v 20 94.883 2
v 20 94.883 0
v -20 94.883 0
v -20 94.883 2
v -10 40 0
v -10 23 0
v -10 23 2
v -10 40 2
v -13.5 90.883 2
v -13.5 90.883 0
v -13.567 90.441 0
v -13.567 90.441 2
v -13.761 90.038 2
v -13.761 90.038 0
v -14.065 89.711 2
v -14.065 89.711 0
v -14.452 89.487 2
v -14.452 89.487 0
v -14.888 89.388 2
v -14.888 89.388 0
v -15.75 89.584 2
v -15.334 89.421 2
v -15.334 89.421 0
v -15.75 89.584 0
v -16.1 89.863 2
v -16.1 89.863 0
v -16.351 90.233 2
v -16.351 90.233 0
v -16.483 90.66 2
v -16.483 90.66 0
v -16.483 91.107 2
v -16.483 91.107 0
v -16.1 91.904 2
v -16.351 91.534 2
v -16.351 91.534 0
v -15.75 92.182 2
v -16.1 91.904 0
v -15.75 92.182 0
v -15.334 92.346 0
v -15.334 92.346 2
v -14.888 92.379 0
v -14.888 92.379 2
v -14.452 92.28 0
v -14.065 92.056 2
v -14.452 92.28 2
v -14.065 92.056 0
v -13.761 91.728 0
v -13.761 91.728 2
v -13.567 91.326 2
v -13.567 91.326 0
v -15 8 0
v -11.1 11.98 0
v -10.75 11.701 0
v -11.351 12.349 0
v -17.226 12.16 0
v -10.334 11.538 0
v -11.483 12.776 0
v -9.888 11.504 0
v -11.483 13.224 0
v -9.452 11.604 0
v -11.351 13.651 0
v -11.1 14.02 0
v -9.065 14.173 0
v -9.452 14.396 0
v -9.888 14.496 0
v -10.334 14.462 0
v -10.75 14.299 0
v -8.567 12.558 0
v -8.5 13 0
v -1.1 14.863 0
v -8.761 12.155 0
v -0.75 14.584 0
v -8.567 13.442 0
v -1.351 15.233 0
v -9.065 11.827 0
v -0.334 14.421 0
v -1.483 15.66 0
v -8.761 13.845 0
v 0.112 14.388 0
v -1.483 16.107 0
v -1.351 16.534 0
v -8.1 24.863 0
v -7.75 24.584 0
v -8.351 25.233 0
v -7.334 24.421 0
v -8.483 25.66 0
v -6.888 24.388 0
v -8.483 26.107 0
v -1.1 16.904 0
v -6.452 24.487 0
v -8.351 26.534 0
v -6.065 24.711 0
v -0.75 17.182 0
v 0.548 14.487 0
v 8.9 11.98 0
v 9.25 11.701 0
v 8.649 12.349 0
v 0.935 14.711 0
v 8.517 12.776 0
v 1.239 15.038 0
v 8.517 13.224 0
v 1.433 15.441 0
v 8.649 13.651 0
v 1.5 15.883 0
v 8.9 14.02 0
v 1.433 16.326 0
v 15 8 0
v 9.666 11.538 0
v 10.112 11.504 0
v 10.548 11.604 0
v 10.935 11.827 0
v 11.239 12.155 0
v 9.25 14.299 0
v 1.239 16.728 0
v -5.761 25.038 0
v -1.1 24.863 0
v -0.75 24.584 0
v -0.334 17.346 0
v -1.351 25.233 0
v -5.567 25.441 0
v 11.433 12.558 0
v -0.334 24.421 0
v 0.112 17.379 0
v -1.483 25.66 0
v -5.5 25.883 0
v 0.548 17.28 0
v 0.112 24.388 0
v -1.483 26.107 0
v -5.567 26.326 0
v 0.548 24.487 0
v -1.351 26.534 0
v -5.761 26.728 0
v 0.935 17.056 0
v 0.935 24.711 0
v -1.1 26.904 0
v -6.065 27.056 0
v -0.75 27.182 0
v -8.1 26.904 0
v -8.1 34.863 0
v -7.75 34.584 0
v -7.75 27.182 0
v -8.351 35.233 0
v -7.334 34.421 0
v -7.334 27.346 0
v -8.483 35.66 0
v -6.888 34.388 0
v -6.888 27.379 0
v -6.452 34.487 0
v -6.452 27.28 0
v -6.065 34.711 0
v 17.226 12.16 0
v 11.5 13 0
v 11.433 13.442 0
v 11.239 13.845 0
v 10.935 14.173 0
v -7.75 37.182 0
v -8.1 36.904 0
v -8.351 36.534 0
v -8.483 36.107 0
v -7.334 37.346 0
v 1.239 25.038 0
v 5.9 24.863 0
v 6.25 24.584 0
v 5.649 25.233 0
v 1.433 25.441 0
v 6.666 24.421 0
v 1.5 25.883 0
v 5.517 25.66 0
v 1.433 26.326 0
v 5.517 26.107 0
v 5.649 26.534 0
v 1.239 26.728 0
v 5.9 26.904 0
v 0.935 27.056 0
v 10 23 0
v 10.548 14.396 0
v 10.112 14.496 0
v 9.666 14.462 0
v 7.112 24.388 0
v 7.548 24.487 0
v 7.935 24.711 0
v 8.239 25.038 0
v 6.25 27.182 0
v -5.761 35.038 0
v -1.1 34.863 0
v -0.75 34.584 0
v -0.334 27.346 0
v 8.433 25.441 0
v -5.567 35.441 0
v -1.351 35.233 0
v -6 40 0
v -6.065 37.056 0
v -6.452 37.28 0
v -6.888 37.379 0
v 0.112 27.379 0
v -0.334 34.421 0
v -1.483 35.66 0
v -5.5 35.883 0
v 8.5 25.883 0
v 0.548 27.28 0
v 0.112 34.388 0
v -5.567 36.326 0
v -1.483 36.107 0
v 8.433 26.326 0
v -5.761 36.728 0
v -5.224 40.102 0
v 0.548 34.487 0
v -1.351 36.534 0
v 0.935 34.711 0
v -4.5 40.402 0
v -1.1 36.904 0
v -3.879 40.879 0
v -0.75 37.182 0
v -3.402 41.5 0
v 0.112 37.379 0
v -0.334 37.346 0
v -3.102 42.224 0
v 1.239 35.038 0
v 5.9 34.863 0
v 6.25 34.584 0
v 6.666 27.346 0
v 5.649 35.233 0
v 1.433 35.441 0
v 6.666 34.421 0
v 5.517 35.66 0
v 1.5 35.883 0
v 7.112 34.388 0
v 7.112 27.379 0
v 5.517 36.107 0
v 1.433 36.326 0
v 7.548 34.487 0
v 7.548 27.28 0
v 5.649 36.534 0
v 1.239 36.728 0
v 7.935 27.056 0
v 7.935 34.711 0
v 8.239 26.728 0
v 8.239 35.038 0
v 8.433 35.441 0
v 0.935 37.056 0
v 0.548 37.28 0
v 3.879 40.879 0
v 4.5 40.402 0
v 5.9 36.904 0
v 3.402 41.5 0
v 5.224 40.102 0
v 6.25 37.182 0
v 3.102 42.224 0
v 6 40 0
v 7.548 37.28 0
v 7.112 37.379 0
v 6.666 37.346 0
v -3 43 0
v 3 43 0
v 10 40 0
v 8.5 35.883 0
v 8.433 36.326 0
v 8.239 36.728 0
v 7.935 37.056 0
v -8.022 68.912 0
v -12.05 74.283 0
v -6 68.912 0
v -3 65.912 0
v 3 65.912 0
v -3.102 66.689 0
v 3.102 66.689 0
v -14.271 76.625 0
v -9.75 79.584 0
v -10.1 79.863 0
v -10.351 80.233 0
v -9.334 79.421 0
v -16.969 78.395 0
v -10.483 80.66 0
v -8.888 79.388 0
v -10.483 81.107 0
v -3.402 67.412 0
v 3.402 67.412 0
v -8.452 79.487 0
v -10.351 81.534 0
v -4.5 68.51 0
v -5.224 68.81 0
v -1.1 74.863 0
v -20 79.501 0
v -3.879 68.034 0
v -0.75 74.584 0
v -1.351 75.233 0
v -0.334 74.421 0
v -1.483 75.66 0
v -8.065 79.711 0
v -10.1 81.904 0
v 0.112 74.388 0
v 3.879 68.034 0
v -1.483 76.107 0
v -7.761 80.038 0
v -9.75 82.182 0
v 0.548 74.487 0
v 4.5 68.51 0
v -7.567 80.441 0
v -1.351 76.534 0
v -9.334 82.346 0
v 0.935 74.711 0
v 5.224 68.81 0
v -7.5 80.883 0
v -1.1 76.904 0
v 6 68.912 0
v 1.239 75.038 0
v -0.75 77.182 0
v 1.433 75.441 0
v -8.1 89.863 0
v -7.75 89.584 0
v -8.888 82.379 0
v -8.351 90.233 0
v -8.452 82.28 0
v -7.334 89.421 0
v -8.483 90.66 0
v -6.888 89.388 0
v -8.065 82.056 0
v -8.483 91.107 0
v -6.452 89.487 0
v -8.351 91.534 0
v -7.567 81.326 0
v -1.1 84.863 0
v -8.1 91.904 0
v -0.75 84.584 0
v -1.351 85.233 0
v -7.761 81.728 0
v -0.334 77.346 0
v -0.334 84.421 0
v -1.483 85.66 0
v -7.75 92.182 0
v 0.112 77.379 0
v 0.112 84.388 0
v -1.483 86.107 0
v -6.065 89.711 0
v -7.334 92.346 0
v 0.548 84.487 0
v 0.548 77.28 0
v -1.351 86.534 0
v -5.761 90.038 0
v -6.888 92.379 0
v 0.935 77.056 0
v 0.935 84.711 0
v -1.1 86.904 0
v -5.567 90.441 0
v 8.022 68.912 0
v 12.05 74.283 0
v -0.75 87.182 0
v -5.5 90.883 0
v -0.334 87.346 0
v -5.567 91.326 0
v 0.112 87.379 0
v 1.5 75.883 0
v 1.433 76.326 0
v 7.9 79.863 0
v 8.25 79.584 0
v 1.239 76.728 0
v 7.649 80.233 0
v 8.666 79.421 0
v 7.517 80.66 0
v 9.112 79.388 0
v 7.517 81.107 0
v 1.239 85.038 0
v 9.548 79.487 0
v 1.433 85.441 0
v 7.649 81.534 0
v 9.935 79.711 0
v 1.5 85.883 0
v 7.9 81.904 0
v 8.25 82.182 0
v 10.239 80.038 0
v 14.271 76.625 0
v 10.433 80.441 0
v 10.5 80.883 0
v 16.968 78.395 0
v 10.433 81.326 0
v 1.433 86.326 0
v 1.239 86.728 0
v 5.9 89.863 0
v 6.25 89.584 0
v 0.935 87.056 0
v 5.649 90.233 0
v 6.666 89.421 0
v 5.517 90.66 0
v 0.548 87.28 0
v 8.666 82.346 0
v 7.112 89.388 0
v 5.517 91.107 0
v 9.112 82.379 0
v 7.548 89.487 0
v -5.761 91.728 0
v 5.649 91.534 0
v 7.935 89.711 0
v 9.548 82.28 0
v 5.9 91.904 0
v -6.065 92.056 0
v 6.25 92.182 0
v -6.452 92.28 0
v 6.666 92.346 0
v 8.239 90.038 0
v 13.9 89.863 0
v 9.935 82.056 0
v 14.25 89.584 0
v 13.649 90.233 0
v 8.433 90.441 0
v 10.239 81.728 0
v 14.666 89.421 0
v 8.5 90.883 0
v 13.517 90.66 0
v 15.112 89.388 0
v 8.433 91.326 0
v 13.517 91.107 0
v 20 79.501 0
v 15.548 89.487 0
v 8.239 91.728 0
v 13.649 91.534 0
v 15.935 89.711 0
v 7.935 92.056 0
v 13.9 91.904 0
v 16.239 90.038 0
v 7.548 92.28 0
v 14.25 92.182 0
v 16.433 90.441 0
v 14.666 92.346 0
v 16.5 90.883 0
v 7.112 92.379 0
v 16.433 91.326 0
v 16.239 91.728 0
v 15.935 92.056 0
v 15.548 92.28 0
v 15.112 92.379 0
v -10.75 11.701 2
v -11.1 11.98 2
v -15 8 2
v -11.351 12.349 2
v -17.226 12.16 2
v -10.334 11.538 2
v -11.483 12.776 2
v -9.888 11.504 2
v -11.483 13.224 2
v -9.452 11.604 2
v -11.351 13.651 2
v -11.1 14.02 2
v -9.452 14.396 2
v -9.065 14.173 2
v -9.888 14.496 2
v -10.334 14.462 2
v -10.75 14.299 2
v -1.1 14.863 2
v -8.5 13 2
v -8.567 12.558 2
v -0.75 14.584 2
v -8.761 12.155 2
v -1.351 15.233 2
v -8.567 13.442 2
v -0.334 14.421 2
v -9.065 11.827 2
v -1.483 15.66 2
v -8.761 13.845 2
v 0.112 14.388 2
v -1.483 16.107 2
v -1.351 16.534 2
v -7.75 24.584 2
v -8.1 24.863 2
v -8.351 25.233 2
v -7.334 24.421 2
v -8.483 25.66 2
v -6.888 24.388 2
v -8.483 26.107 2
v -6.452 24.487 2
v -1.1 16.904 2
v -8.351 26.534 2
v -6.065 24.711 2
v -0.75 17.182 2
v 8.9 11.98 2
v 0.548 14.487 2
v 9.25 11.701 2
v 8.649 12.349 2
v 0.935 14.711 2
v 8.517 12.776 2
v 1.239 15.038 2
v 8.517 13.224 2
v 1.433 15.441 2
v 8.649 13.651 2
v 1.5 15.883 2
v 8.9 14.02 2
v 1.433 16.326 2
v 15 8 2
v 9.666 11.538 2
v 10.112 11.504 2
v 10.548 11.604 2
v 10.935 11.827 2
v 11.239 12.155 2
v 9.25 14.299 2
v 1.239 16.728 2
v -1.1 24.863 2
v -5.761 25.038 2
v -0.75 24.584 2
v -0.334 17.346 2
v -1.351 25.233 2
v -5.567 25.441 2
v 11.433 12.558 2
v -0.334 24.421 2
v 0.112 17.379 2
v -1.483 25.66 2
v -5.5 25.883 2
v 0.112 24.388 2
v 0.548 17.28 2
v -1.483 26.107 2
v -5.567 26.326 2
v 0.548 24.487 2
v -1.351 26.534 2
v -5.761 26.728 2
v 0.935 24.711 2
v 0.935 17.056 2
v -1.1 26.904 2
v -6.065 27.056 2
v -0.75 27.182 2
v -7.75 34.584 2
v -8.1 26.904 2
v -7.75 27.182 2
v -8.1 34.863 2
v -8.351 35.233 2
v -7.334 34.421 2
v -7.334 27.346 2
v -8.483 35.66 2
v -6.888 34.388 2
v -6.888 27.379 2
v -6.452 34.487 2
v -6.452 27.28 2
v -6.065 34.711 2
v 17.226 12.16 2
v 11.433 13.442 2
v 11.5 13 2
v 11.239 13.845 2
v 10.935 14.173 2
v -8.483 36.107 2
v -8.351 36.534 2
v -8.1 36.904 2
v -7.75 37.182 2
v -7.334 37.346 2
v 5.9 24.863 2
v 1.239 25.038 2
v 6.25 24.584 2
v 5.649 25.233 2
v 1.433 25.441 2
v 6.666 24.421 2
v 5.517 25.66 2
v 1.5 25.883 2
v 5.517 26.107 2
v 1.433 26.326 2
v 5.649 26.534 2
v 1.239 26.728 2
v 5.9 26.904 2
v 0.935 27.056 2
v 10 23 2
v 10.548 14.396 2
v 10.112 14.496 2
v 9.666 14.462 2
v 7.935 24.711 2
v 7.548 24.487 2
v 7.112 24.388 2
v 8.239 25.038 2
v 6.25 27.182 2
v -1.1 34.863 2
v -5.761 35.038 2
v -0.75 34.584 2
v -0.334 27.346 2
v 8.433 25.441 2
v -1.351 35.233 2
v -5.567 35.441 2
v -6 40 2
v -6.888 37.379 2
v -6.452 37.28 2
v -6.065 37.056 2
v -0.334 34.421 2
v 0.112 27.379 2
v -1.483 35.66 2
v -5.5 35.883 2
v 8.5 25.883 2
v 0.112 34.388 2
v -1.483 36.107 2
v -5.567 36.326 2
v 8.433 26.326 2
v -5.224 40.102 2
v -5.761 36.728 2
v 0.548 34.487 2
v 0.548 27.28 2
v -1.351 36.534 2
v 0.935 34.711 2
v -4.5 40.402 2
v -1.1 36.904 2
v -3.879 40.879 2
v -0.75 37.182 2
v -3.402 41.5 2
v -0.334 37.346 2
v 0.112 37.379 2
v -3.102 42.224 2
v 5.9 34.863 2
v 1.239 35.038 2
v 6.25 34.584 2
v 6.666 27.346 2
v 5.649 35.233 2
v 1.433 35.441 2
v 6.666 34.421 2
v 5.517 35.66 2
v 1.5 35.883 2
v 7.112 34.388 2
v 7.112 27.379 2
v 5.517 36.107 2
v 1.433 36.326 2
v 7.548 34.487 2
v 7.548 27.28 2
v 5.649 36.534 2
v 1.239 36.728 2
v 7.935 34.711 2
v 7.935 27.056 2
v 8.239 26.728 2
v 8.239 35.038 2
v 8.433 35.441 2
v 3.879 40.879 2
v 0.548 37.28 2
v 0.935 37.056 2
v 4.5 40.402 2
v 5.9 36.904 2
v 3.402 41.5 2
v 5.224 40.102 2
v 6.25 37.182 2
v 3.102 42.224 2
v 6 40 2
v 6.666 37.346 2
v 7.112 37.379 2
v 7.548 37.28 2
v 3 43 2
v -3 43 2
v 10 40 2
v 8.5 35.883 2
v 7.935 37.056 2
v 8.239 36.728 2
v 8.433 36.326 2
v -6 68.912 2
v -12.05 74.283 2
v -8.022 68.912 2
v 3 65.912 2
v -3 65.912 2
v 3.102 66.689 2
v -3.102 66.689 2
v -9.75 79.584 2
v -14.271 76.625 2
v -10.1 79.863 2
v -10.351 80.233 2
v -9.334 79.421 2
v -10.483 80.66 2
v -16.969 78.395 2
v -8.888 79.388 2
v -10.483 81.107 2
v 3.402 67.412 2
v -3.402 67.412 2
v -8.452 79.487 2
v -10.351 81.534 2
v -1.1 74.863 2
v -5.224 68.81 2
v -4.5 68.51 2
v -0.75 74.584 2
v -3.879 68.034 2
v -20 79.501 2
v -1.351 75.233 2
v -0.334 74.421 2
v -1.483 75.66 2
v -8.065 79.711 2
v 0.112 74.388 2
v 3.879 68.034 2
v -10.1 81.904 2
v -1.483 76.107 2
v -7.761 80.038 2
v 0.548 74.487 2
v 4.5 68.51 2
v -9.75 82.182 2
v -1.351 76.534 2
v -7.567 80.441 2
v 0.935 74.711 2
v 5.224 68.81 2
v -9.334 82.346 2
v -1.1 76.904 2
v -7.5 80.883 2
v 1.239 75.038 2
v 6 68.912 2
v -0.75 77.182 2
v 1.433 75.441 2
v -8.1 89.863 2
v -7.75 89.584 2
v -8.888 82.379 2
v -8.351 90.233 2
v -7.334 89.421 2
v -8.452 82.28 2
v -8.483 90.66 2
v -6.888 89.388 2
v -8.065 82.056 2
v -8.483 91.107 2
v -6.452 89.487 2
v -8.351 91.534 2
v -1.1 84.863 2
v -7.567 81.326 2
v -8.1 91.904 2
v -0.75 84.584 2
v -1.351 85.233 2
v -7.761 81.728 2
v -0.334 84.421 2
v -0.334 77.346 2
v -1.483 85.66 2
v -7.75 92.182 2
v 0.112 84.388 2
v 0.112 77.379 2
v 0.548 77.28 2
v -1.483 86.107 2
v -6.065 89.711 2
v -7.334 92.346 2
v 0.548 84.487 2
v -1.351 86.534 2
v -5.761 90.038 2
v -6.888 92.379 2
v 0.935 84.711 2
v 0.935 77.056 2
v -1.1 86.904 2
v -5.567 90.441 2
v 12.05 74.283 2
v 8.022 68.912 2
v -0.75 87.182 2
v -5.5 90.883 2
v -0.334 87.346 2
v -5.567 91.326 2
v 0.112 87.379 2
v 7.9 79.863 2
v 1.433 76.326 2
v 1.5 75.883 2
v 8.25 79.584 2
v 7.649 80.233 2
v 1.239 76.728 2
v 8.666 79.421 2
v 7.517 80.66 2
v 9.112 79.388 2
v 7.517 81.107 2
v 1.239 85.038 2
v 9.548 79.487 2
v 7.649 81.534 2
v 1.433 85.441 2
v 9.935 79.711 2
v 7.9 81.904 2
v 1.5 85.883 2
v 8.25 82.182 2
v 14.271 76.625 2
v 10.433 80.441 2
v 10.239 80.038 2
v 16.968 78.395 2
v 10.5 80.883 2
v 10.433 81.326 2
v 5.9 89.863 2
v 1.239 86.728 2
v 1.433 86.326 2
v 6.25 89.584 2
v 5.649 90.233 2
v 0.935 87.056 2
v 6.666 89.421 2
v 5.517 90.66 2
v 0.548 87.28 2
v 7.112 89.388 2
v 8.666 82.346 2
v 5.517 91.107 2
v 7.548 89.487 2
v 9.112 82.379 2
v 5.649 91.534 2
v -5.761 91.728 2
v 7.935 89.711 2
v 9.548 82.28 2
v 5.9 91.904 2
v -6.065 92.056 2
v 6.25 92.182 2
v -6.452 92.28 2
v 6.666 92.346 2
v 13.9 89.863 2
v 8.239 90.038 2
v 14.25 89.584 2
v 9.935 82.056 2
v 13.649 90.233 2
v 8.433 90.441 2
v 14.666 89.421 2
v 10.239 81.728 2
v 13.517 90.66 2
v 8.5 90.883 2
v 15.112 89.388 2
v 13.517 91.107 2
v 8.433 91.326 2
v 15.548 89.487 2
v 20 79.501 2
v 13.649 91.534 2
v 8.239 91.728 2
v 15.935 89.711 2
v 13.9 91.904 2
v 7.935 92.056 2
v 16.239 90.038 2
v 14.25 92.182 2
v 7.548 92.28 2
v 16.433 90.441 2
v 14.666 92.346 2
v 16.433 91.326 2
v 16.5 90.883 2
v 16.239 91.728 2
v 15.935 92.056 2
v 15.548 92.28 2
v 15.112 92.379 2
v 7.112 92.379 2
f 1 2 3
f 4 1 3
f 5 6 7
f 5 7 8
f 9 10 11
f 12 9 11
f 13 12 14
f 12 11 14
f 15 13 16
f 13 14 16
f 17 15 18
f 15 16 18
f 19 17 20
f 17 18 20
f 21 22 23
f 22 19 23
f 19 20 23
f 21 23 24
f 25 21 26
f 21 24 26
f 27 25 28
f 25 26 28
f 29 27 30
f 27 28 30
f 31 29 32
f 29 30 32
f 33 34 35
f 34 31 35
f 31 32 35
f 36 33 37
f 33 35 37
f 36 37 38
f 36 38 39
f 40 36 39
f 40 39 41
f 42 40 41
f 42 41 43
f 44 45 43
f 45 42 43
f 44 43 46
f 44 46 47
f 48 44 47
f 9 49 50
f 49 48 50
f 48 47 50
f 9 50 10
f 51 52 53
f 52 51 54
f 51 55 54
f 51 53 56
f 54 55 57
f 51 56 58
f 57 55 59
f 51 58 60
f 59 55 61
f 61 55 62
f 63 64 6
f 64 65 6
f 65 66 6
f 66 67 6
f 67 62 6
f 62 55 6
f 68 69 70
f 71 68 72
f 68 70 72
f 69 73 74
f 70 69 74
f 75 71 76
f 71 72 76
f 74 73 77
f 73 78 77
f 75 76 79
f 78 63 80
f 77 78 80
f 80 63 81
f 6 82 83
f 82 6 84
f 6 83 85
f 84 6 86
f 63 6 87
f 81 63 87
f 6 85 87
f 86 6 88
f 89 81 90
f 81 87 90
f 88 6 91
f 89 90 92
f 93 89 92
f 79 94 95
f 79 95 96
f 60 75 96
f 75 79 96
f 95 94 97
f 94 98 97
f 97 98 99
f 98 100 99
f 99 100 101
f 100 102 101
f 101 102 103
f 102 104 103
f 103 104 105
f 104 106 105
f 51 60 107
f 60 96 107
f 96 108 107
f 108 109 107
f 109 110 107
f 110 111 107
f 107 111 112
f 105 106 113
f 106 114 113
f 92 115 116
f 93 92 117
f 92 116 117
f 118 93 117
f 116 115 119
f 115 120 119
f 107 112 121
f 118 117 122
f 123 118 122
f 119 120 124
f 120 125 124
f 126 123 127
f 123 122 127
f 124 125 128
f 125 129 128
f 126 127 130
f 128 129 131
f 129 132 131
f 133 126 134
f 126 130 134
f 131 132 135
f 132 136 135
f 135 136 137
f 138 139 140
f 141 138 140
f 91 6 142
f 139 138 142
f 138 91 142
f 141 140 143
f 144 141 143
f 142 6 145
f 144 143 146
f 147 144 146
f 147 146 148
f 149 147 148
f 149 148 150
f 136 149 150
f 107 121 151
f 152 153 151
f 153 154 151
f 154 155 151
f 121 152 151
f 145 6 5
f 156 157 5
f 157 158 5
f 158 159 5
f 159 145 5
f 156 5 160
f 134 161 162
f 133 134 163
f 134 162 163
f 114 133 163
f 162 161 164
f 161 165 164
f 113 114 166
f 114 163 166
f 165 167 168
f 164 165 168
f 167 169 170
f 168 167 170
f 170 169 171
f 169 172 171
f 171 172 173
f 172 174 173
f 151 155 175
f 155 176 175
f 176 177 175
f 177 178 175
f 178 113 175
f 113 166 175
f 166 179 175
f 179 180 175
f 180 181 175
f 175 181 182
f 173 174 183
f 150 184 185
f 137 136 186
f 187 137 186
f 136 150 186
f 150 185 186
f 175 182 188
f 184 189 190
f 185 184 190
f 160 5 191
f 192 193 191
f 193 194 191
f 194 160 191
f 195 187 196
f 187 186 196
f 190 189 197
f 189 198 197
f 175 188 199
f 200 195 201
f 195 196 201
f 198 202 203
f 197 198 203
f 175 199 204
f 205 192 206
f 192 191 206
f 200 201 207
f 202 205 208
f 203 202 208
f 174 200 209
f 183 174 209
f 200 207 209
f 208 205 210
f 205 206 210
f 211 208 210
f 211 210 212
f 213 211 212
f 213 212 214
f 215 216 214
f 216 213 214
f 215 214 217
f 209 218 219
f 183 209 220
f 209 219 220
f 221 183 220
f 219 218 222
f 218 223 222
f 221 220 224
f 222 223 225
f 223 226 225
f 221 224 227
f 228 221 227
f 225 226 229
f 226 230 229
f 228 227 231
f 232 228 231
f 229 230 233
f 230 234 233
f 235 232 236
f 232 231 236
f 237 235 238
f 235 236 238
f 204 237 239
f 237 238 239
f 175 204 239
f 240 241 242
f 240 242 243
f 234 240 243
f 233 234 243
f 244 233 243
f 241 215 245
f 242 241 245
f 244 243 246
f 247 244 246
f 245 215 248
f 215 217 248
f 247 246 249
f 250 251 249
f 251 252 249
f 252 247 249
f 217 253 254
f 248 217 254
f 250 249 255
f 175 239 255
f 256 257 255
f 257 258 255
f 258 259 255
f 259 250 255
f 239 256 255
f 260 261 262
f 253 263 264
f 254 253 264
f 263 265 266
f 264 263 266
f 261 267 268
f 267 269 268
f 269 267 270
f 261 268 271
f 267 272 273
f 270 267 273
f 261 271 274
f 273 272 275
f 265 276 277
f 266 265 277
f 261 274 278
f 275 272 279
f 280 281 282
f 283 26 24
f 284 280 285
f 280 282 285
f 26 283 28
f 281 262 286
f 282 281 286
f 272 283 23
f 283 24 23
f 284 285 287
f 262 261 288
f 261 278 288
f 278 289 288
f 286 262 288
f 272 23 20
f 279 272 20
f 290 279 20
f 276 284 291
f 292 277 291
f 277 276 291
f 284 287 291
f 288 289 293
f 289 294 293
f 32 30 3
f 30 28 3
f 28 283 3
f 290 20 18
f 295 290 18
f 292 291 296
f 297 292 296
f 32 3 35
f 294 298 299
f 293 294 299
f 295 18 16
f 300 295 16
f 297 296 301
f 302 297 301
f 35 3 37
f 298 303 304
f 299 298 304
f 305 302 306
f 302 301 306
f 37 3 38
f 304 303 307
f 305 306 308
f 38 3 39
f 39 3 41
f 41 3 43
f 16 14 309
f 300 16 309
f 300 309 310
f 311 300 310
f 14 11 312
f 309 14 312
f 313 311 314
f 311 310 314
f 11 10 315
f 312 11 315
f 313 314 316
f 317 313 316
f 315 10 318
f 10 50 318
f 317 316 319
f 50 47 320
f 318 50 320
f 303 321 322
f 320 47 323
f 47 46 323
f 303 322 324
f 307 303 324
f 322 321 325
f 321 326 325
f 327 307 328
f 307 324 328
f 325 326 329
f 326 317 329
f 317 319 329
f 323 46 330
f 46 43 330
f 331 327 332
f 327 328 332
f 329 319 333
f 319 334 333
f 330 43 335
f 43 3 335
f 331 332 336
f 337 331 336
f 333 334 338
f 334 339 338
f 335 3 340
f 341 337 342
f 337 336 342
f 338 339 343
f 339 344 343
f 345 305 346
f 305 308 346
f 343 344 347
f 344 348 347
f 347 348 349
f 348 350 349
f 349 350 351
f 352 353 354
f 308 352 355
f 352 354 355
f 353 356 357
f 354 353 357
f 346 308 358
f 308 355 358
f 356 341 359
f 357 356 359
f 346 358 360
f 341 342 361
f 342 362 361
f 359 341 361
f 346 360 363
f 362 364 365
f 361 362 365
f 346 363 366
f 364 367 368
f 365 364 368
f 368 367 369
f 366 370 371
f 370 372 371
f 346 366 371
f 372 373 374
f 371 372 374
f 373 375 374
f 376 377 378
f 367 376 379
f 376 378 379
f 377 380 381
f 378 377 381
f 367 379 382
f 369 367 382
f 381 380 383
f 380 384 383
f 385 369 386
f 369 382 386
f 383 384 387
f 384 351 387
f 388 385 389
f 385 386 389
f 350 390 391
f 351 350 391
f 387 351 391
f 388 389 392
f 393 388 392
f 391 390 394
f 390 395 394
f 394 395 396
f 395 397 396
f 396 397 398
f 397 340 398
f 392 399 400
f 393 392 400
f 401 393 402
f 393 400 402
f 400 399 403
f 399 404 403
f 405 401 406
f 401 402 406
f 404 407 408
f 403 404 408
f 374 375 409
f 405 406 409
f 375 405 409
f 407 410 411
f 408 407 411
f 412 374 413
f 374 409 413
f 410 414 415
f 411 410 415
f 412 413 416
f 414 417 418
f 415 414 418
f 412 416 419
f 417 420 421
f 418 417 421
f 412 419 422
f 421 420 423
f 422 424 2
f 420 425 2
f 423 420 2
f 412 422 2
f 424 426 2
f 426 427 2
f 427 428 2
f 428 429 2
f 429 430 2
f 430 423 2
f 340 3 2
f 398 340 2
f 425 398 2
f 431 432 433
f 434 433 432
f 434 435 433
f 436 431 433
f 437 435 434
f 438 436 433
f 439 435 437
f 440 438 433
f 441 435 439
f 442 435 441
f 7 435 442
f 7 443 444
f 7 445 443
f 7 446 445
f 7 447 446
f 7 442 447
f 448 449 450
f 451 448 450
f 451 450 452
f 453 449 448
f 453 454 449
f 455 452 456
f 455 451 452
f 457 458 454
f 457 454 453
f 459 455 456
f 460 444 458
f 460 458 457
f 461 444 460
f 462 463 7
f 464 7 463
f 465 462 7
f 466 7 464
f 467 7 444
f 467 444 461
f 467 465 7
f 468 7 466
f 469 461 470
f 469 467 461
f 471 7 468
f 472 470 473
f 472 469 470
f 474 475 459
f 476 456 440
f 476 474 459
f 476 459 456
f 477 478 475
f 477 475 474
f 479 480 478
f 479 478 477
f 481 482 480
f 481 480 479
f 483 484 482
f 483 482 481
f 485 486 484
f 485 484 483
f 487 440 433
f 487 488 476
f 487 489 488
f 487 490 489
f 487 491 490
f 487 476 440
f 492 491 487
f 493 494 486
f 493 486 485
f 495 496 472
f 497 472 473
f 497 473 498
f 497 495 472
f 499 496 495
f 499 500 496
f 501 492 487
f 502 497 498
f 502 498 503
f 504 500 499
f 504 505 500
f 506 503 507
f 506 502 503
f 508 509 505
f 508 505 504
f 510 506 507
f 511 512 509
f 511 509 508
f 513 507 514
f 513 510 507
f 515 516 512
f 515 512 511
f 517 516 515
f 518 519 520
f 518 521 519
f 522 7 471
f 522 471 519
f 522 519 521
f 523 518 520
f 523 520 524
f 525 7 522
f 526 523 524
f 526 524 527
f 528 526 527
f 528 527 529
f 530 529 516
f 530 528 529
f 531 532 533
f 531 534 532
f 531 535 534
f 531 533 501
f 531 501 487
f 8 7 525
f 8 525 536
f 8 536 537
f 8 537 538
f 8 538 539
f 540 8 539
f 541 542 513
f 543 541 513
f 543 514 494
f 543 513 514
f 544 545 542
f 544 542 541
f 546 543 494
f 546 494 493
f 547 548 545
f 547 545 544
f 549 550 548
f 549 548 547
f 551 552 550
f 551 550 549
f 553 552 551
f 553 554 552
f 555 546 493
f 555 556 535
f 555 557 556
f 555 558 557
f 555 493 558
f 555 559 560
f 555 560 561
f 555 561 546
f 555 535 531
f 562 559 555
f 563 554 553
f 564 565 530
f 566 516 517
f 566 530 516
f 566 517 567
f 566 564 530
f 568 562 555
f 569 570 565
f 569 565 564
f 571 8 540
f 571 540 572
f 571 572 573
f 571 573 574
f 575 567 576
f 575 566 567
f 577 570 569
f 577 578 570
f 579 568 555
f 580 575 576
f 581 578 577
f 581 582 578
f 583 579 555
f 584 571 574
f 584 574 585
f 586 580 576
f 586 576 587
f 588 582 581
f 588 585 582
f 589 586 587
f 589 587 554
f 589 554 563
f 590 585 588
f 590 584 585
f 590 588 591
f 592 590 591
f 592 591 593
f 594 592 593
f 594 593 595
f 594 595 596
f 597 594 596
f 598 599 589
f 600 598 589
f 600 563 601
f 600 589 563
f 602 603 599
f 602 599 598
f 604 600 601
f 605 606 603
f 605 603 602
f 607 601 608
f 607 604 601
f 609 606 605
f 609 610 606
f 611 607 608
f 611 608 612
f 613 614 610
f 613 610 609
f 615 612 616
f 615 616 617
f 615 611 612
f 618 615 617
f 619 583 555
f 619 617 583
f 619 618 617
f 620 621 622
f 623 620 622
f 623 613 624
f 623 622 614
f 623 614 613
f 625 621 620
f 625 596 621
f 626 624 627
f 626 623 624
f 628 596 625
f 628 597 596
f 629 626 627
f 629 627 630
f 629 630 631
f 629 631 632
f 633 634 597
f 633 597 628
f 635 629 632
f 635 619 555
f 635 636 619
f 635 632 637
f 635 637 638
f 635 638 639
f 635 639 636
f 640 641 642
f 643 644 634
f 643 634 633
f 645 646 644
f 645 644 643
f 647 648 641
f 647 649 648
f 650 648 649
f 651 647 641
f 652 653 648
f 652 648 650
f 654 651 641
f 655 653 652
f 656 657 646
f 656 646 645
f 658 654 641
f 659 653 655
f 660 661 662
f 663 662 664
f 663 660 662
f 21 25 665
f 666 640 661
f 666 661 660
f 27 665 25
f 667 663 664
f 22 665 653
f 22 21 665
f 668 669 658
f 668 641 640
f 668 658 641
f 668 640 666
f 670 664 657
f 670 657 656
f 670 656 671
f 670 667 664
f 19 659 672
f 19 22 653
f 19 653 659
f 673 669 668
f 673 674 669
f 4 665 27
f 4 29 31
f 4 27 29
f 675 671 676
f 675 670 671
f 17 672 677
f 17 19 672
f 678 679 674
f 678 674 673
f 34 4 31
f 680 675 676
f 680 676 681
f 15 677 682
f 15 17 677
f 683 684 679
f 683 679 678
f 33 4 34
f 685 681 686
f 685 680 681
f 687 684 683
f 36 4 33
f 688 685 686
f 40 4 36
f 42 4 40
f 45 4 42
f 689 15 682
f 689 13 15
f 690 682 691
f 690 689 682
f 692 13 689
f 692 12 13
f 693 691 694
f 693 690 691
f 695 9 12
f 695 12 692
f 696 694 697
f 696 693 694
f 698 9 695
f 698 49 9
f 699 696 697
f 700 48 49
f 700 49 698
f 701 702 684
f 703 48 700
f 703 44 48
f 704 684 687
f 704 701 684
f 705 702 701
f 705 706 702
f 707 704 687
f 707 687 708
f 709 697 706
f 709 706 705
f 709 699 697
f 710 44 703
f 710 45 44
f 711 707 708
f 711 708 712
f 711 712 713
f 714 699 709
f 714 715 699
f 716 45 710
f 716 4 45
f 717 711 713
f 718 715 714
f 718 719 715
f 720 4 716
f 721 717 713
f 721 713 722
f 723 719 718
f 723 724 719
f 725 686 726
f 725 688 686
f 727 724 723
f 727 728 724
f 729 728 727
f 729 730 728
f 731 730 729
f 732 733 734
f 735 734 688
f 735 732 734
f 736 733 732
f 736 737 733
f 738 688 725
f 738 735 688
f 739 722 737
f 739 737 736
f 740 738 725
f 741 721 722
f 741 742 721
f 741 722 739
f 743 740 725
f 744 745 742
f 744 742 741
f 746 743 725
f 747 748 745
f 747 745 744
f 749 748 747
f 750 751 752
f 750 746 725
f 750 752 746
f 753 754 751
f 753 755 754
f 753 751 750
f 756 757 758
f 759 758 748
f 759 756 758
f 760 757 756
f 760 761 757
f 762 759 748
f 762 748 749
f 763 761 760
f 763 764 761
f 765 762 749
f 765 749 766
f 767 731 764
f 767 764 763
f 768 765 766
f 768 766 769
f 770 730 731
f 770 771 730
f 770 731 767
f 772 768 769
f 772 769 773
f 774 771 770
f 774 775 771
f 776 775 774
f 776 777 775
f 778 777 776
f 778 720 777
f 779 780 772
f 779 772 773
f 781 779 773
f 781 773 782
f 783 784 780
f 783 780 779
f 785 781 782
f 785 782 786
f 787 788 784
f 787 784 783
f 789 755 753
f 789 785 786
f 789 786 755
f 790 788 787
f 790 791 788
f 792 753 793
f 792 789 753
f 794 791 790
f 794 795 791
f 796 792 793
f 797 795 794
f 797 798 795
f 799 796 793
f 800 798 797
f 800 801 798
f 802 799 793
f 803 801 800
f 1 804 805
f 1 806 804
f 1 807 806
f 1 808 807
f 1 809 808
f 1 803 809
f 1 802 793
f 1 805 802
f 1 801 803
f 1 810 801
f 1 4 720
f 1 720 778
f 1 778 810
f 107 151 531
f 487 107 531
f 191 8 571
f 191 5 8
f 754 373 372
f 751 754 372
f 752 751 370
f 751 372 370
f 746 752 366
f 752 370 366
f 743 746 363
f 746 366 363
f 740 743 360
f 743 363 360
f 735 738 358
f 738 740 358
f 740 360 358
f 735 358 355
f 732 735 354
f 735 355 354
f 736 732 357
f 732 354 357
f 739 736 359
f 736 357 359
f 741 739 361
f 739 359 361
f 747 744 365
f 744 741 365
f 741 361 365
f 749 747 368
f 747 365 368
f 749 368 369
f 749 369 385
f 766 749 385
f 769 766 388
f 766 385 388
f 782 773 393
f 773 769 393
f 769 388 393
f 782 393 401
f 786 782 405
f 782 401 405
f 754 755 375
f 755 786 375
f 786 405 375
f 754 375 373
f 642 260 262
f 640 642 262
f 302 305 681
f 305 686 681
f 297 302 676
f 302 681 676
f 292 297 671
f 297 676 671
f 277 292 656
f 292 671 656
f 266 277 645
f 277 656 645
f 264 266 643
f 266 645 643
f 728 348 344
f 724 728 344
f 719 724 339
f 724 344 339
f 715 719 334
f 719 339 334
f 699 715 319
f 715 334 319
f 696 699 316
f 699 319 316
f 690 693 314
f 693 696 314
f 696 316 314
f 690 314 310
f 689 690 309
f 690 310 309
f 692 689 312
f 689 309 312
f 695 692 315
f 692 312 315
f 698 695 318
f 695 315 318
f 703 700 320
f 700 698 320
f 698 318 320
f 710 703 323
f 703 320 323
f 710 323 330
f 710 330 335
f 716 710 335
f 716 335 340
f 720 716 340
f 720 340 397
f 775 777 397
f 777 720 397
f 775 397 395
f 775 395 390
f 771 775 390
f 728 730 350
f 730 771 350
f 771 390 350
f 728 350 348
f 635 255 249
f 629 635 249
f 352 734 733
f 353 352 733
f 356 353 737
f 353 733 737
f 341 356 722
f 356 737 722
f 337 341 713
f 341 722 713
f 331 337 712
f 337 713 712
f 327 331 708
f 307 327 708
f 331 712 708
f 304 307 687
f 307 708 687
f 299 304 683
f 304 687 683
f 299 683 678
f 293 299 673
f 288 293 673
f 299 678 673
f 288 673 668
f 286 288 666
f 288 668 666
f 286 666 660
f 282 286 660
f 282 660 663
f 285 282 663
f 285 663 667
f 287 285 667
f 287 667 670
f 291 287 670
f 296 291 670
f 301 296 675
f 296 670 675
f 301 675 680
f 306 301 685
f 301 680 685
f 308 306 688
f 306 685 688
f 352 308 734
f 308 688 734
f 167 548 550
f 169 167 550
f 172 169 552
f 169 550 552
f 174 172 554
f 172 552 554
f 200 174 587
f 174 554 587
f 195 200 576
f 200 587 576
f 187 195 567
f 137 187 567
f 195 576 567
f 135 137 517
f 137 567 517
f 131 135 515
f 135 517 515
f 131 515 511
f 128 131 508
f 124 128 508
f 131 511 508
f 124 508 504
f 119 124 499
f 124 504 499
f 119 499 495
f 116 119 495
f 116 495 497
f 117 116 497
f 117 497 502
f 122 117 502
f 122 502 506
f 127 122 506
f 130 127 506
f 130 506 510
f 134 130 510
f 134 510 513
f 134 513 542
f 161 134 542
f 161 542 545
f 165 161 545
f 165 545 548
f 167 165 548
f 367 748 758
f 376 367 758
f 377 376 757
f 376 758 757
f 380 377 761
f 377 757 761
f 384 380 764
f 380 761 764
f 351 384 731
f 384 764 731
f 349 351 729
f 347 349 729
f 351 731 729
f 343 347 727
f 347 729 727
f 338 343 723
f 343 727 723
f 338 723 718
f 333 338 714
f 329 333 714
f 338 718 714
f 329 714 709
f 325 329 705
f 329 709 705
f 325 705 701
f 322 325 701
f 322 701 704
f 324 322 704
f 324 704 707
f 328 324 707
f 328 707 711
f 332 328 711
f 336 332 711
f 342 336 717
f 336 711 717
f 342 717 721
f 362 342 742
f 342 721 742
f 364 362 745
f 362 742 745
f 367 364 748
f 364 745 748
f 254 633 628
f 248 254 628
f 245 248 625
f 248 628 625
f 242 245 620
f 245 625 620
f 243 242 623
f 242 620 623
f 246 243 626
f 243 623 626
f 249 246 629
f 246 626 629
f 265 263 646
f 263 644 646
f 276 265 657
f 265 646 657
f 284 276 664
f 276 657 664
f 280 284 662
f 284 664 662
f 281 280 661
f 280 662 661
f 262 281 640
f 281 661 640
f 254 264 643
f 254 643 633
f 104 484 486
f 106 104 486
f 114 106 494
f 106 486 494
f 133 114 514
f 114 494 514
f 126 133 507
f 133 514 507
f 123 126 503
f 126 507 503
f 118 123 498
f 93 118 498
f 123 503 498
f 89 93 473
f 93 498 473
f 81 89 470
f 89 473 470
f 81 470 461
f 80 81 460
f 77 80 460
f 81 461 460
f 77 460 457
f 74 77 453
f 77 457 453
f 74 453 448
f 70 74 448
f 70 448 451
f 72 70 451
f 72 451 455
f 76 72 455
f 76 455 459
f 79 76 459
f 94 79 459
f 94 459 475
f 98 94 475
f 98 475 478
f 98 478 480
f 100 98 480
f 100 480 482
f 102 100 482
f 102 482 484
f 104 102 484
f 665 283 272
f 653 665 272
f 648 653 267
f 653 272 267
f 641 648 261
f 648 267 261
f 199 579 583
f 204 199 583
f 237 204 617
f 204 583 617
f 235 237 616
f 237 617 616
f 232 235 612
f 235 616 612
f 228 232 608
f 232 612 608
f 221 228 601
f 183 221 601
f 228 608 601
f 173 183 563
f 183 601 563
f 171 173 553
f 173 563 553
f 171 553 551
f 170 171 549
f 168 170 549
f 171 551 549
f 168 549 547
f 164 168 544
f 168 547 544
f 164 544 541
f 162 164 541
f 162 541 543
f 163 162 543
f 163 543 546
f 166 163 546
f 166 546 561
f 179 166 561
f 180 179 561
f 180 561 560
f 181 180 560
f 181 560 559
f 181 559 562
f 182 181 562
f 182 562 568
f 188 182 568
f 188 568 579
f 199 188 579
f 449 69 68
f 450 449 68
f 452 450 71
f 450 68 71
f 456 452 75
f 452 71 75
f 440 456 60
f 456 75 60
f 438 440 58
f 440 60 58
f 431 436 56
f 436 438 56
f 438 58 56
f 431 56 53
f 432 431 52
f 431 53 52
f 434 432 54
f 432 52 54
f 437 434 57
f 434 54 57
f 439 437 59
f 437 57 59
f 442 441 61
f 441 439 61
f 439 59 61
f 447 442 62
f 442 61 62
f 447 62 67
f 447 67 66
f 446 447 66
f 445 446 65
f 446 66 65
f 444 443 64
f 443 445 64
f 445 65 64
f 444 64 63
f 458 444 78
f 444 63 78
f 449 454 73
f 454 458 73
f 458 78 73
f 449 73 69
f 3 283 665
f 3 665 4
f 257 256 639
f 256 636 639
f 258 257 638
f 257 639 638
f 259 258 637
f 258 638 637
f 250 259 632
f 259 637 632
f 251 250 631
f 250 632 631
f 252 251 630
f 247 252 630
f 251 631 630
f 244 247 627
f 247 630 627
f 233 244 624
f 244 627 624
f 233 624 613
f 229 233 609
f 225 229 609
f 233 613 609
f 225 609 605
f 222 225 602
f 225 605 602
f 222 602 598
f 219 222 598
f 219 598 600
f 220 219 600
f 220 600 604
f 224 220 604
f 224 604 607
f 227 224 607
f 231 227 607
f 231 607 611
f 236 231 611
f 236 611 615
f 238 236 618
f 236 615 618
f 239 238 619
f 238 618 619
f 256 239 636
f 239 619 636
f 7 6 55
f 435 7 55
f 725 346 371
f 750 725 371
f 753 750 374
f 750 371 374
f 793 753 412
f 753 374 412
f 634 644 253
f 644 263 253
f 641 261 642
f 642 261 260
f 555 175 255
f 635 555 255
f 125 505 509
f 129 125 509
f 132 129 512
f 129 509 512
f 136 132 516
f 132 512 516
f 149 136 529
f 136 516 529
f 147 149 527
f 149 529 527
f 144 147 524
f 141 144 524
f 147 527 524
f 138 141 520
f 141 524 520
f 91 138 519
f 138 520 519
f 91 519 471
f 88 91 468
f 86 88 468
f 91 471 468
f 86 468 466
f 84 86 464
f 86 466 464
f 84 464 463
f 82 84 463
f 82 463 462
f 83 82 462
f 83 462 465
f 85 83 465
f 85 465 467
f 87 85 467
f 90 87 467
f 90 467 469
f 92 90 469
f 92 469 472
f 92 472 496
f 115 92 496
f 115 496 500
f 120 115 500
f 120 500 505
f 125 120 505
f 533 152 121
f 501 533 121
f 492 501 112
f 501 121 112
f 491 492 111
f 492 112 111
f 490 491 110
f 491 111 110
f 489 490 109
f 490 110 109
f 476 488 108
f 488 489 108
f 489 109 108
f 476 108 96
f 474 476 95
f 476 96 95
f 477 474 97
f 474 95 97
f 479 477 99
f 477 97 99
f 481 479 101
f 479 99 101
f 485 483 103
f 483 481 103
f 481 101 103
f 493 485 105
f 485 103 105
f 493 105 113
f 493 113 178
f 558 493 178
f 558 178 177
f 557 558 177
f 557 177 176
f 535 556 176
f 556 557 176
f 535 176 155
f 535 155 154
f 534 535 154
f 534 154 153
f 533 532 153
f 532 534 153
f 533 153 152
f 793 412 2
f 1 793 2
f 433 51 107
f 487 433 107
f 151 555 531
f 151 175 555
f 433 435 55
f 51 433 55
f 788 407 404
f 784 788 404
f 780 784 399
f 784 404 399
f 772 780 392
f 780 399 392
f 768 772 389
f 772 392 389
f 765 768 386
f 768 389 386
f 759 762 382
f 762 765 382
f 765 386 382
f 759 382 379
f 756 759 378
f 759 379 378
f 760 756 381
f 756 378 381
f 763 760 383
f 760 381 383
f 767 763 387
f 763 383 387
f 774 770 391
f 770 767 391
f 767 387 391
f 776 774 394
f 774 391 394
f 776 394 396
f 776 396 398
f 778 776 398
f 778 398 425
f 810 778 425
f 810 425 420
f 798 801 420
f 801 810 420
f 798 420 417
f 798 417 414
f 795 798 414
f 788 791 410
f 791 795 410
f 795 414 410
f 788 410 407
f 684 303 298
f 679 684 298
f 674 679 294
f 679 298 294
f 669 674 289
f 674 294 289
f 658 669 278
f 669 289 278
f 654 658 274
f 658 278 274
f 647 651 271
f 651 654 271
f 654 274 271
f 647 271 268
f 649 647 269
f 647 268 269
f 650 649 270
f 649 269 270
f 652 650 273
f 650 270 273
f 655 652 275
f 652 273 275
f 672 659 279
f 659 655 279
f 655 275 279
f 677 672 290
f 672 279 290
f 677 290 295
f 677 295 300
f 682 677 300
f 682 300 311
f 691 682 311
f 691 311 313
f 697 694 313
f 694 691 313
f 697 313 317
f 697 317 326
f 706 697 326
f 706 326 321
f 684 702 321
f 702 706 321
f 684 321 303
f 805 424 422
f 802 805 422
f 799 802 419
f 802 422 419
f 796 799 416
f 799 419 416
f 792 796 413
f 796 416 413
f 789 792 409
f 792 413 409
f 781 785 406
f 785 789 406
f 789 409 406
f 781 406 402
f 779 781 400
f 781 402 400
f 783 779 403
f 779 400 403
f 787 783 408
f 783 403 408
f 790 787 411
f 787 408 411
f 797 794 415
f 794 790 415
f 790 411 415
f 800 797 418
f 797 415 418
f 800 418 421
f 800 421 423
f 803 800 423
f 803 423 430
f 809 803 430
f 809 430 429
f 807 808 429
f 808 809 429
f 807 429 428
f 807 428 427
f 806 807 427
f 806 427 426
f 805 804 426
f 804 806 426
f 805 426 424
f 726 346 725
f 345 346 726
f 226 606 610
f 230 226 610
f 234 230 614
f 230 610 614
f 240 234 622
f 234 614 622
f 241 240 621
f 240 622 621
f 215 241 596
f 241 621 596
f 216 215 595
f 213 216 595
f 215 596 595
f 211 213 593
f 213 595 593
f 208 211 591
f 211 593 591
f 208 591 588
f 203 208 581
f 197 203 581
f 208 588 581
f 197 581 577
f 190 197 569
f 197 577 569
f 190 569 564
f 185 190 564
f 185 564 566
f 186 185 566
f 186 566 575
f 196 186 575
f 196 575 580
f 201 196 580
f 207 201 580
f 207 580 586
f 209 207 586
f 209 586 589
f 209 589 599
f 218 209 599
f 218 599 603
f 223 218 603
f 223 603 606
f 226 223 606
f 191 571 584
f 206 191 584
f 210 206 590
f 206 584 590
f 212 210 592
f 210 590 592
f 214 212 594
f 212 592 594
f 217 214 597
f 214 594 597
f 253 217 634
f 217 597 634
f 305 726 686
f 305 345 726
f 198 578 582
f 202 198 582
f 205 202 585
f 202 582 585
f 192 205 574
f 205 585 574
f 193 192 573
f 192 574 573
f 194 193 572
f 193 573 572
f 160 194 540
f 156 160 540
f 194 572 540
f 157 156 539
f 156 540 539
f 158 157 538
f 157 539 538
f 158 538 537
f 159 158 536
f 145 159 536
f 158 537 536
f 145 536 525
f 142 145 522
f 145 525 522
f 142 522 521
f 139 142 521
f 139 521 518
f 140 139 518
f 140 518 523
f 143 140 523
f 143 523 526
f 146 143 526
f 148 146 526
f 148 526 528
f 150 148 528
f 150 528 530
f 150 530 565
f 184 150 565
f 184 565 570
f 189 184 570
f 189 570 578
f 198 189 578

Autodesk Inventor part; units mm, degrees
ref_plane "YZ Plane" through (0, 0, 0) normal (1, 0, 0) x (0, 1, 0)
ref_plane "XZ Plane" through (0, 0, 0) normal (0, 1, 0) x (-1, 0, 0)
ref_plane "XY Plane" through (0, 0, 0) normal (0, 0, 1) x (1, 0, 0)
sketch "Sketch1" plane through (0, 0, 0) normal (0, 0, 1) x (1, 0, 0)
  circle A0 centre (-14, 4) radius 1.5 projected
  circle A1 centre (-10, 13) radius 1.5 projected
  circle A2 centre (-7, 4) radius 1.5 projected
  line L0 (-20, 0) -> (-20, 8) projected
  line L1 (0, 0) -> (-20, 0) projected
  line L2 (0, 40) -> (0, 0) projected
  line L3 (-10, 40) -> (0, 40) projected
  line L4 (-10, 23) -> (-10, 40) projected
  line L5 (-10, 23) -> (-20, 8) projected
  circle A3 centre (14, 4) radius 1.5 projected
  circle A4 centre (10, 13) radius 1.5 projected
  circle A5 centre (7, 4) radius 1.5 projected
  line L6 (20, 0) -> (20, 8) projected
  line L7 (10, 23) -> (20, 8) projected
  line L8 (10, 23) -> (10, 40) projected
  line L9 (10, 40) -> (0, 40) projected
  line L10 (0, 40) -> (0, 0) projected
  line L11 (0, 0) -> (20, 0) projected
  line L12 (3, 84.8834) -> (-3, 84.8834) projected
  line L13 (-3, 84.8834) -> (-3, -165.1166) projected
  line L14 (3, -165.1166) -> (-3, -165.1166) projected
  line L15 (3, 84.8834) -> (3, -165.1166) projected
  circle A6 centre (-9, 80.8834) radius 1.5 projected
  circle A7 centre (-7, 90.8834) radius 1.5 projected
  circle A8 centre (-15, 90.8834) radius 1.5 projected
  line L16 (-12.05, 74.2834) -> (-8.0217, 68.9123) projected
  line L17 (-8.0217, 68.9123) -> (0, 68.9123) projected
  line L18 (0, 94.8834) -> (0, 68.9123) projected
  line L19 (0, 94.8834) -> (-20, 94.8834) projected
  line L20 (-20, 79.501) -> (-20, 94.8834) projected
  arc A9 (-12.05, 74.2834) -> (-20, 79.501) centre (-23.25, 65.8834) ccw projected
  line L21 (3, 94.8834) -> (3, 68.9123) projected
  circle A10 centre (9, 80.8834) radius 1.5 projected
  circle A11 centre (7, 90.8834) radius 1.5 projected
  circle A12 centre (15, 90.8834) radius 1.5 projected
  line L22 (12.05, 74.2834) -> (8.0217, 68.9123) projected
  arc A13 (20, 79.501) -> (12.05, 74.2834) centre (23.25, 65.8834) ccw projected
  line L23 (20, 79.501) -> (20, 94.8834) projected
  line L24 (0, 94.8834) -> (20, 94.8834) projected
  line L25 (0, 94.8834) -> (0, 68.9123) projected
  line L26 (8.0217, 68.9123) -> (0, 68.9123) projected
  line L27 (-20, 8) -> (20, 8)
  line L28 (-3, 40) -> (3, 40)
  line L29 (3, 40) -> (3, 68.9123)
  line L30 (3, 68.9123) -> (-3, 68.9123)
  line L31 (-3, 68.9123) -> (-3, 40)
  point P0 (3, 40)
  point P1 (-3, 68.9123)
extrude "Extrusion1" add sketch "Sketch1" along normal blind 2 contours L5 L4 L3 L13 L27 | L13 L3 L2 L27 | L13 L17 L26 L15 L9 L3 | L2 L9 L15 L27 | L17 L16 A9 L20 L19 L18 L12 L13 | L13 L12 L18 L17 | L15 L9 L8 L7 L27 | L18 L12 L15 L26 | L15 L21 L24 L23 A13 L22 L26 | L18 L24 L21 L12
chamfer "Chamfer1" distance 5 angle 45 2 edges at (20, 8, 1) (-20, 8, 1)
fillet "Fillet1" radius 3 4 edges at (3, 40, 1) (-3, 40, 1) (-3, 68.9123, 1) (3, 68.9123, 1)
sketch "Sketch2" plane through (0, 0, 2) normal (0, 0, 1) x (1, 0, 0)
  line L0 (-15, 8) -> (-17.2265, 12.1603) projected
  line L1 (-15, 8) -> (15, 8) projected
  line L2 (17.2265, 12.1603) -> (15, 8) projected
  line L3 (17.2265, 12.1603) -> (10, 23) projected
  line L4 (10, 23) -> (10, 40) projected
  line L5 (10, 40) -> (6, 40) projected
  arc A0 (3, 43) -> (6, 40) centre (6, 43) ccw projected
  line L6 (3, 43) -> (3, 65.9123) projected
  arc A1 (6, 68.9123) -> (3, 65.9123) centre (6, 65.9123) ccw projected
  line L7 (6, 68.9123) -> (8.0217, 68.9123) projected
  line L8 (8.0217, 68.9123) -> (12.05, 74.2834) projected
  arc A2 (20, 79.501) -> (12.05, 74.2834) centre (23.25, 65.8834) ccw projected
  line L9 (20, 79.501) -> (20, 94.8834) projected
  line L10 (20, 94.8834) -> (-20, 94.8834) projected
  line L11 (-20, 94.8834) -> (-20, 79.501) projected
  arc A3 (-12.05, 74.2834) -> (-20, 79.501) centre (-23.25, 65.8834) ccw projected
  line L12 (-12.05, 74.2834) -> (-8.0217, 68.9123) projected
  line L13 (-8.0217, 68.9123) -> (-6, 68.9123) projected
  arc A4 (-3, 65.9123) -> (-6, 68.9123) centre (-6, 65.9123) ccw projected
  line L14 (-3, 65.9123) -> (-3, 43) projected
  arc A5 (-6, 40) -> (-3, 43) centre (-6, 43) ccw projected
  line L15 (-6, 40) -> (-10, 40) projected
  line L16 (-10, 40) -> (-10, 23) projected
  line L17 (-10, 23) -> (-17.2265, 12.1603) projected
  circle A6 centre (10, 13) radius 1.5 projected
  circle A7 centre (7, 90.8834) radius 1.5 projected
  circle A8 centre (9, 80.8834) radius 1.5 projected
  circle A9 centre (15, 90.8834) radius 1.5 projected
  circle A10 centre (-9, 80.8834) radius 1.5 projected
  circle A11 centre (-7, 90.8834) radius 1.5 projected
  circle A12 centre (-15, 90.8834) radius 1.5 projected
  circle A13 centre (-10, 13) radius 1.5 projected
  circle A14 centre (7, 90.8834) radius 1.5 projected
  line L18 (7, 90.8834) -> (7, 35.8834)
  line L19 (7, 35.8834) -> (7, 25.8834)
  circle A15 centre (7, 35.8834) radius 1.5
  circle A16 centre (7, 25.8834) radius 1.5
  circle A17 centre (-7, 90.8834) radius 1.5 projected
  line L20 (-7, 90.8834) -> (-7, 35.8834)
  line L21 (-7, 35.8834) -> (-7, 25.8834)
  circle A18 centre (-7, 35.8834) radius 1.5
  circle A19 centre (-7, 25.8834) radius 1.5
  line L22 (-7, 35.8834) -> (7, 35.8834)
  line L23 (-7, 25.8834) -> (7, 25.8834)
  circle A20 centre (0, 35.8834) radius 1.5
  circle A21 centre (0, 25.8834) radius 1.5
  line L24 (0, 25.8834) -> (0, 15.8834)
  circle A22 centre (0, 15.8834) radius 1.5
  line L25 (0, 35.8834) -> (0, 75.8834)
  line L26 (0, 75.8834) -> (0, 85.8834)
  circle A23 centre (0, 85.8834) radius 1.5
  circle A24 centre (0, 75.8834) radius 1.5
  point P0 (0, 0)
  dimension "d6" = 55
  dimension "d7" = 10
  dimension "d8" = 3
  dimension "d9" = 3
  dimension "d10" = 55
  dimension "d11" = 10
  dimension "d12" = 3
  dimension "d13" = 3
  dimension "d14" = 3
  dimension "d15" = 3
  dimension "d16" = 10
  dimension "d17" = 3
  dimension "d18" = 40
  dimension "d19" = 10
  dimension "d20" = 3
  dimension "d21" = 3
extrude "Extrusion2" cut sketch "Sketch2" against normal blind 10 contours A22 | A23 | A24 L26 L25 | L25 L26 A24 | A18 L22 L20 | L20 L21 A18 | L22 A18 L21 | A15 L19 L18 | L18 L22 A15 | A20 L25 L22 | L22 A20 | A19 L23 L21 | L21 L23 A19 | L19 A15 L22 | L25 A20 L22 | A21 L23 | L23 L24 A21 | A16 L23 L19 | L19 L23 A16 | L23 A21 L24
properties part number "body_bone_4"
